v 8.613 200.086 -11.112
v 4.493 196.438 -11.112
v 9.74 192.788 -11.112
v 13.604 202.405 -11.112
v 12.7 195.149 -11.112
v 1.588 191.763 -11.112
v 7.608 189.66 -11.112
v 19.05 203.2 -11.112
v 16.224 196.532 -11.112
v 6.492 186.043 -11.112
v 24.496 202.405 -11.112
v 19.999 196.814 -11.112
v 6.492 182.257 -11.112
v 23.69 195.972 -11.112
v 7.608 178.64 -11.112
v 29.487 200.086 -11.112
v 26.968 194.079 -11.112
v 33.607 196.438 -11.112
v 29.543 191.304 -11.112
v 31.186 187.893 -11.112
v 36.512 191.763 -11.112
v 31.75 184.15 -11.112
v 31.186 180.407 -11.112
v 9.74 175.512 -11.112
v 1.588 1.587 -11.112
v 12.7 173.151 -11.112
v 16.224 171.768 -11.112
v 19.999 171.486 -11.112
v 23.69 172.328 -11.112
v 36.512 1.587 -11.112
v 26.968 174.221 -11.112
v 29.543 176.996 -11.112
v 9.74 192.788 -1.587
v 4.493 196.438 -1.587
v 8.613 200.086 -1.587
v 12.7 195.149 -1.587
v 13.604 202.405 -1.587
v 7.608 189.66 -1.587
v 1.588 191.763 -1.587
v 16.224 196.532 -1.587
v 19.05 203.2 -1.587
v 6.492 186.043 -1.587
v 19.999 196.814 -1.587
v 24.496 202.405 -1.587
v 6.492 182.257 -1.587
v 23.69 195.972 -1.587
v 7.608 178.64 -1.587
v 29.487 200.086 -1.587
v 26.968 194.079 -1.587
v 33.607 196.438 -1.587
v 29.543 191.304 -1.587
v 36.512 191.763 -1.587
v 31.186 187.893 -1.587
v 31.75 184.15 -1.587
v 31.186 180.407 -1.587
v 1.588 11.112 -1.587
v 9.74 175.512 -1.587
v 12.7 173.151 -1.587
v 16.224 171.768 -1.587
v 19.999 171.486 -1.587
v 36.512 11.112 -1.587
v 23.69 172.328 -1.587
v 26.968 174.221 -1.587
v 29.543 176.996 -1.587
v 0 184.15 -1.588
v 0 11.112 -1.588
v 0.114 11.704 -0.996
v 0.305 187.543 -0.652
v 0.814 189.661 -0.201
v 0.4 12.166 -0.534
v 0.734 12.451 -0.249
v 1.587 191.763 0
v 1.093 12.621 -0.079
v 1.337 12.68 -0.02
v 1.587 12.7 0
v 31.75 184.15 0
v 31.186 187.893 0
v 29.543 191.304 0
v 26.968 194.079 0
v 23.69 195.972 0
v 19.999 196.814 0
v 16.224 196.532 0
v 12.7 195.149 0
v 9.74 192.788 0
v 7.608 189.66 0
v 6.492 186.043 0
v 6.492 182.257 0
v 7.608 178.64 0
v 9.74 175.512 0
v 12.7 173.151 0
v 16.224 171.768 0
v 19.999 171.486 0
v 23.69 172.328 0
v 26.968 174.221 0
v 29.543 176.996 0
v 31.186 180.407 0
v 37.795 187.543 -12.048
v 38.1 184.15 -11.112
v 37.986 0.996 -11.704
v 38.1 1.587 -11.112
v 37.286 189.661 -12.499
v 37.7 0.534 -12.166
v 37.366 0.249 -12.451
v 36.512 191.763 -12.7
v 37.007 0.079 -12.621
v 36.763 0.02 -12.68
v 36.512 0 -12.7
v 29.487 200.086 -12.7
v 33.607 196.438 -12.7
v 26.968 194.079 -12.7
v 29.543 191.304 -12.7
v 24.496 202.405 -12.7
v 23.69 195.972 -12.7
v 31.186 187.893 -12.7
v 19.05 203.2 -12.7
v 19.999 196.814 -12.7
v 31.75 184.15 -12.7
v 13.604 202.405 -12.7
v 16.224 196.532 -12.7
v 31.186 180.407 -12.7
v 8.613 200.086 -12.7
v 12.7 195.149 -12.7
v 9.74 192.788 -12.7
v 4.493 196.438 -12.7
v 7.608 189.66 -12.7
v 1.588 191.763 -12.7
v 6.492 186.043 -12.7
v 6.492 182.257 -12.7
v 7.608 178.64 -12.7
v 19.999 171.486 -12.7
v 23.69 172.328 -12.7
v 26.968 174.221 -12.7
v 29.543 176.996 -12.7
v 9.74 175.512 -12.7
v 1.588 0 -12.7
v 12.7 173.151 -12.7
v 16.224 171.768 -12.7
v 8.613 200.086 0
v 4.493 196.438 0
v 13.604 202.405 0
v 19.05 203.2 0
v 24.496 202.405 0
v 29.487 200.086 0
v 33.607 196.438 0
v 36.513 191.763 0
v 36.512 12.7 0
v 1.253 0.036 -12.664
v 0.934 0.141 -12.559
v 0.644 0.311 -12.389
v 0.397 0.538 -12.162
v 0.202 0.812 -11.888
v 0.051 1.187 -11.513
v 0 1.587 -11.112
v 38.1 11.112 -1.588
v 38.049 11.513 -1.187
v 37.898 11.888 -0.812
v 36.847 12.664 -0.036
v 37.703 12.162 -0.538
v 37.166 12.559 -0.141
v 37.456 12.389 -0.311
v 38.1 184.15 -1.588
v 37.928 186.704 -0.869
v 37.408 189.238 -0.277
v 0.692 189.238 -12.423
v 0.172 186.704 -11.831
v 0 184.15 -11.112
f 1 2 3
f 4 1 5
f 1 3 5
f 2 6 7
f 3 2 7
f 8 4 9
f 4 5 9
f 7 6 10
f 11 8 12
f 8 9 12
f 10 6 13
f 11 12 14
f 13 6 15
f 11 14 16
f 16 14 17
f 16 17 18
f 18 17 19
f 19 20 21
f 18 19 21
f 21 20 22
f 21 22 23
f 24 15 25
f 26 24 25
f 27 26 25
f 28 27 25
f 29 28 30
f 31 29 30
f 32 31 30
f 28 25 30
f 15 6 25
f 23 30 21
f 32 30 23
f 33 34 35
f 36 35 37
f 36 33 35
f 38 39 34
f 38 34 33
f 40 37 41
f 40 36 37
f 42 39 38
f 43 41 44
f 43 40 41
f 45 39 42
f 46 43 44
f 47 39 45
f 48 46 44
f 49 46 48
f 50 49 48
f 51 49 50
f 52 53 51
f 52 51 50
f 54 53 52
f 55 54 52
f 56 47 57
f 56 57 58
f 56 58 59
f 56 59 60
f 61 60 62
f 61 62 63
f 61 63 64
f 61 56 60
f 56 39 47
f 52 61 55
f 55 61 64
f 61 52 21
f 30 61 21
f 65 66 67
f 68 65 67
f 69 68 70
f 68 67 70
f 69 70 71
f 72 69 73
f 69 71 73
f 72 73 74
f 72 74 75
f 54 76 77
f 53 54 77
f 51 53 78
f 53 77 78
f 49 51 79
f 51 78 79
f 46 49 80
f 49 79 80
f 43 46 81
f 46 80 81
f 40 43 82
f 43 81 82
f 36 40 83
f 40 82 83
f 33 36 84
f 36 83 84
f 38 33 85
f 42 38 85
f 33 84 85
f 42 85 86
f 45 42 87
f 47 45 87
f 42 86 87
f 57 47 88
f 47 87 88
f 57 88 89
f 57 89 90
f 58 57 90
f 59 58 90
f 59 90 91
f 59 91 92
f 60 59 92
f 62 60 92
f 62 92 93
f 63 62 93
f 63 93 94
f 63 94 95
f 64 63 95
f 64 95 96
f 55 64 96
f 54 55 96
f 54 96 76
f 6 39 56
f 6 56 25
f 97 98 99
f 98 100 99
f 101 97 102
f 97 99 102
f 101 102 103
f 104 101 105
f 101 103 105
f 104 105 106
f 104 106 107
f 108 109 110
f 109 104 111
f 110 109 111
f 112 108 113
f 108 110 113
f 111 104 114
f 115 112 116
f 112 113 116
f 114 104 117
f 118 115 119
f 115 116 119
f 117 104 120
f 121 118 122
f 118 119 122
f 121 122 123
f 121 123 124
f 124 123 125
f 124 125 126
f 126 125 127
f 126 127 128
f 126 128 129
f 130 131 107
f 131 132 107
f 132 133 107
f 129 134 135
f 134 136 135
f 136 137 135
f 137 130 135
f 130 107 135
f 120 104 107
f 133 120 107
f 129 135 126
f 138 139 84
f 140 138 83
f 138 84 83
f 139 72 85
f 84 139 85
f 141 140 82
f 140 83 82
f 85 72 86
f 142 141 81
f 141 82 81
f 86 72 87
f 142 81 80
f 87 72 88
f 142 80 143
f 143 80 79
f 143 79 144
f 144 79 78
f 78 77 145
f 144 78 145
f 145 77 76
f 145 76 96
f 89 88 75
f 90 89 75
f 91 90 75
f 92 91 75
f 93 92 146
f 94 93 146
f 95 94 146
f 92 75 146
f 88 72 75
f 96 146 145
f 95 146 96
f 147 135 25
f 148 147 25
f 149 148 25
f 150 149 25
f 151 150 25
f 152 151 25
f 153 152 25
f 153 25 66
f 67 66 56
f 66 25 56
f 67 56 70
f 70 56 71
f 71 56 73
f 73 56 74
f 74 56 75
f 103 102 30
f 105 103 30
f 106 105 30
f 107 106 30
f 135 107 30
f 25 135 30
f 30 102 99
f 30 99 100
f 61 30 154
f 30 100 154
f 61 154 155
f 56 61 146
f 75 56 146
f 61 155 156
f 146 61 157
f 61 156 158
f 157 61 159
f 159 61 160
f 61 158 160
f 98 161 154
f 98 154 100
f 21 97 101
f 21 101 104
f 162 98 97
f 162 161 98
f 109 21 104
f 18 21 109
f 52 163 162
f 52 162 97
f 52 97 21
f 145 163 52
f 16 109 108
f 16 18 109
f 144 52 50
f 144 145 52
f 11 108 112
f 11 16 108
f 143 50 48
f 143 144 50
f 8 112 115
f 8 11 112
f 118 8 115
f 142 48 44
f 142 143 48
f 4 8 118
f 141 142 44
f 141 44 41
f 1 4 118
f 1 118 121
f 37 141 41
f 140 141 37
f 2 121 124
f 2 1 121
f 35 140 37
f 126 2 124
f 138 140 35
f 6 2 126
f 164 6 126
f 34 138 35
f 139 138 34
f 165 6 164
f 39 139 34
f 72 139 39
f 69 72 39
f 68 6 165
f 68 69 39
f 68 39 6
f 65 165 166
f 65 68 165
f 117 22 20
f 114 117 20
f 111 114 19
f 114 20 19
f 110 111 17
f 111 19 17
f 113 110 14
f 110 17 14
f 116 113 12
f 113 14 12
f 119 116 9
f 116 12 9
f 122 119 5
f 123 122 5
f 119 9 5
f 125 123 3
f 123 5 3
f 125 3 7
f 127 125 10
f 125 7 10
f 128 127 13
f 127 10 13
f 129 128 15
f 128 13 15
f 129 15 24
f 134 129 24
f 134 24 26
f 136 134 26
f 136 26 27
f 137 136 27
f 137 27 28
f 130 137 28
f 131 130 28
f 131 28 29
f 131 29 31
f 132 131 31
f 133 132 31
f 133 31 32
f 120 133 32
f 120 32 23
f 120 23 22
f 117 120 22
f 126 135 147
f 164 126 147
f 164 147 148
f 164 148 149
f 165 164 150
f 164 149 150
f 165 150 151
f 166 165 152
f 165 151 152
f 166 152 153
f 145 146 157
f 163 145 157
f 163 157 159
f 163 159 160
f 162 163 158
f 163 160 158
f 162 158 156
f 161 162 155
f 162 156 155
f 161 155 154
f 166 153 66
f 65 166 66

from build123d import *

# Parameters (mm, degrees)
SKETCH1_W           = 34.925
SKETCH1_H           = 9.525
BOSS_EXTRUDE1_DEPTH = 203.2
SKETCH2_R           = 12.7
CUT_EXTRUDE1_DEPTH  = 13.7
CUT_EXTRUDE2_DEPTH  = 39.1000001


with BuildPart() as part:
    # Sketch1 → Boss-Extrude1 (new body)
    with BuildSketch(Plane(origin=(0, 0, 0), x_dir=(1, 0, 0), z_dir=(0, 1, 0))):
        with BuildLine():
            Line((1.5875, 0), (36.5125, 0))
            ThreePointArc((36.5125, 0), (37.635032015, 0.464967985), (38.1, 1.5875))
            Line((38.1, 1.5875), (38.1, 11.1125))
            ThreePointArc((38.1, 11.1125), (37.635032015, 12.235032015), (36.5125, 12.7))
            Line((36.5125, 12.7), (1.5875, 12.7))
            ThreePointArc((1.5875, 12.7), (0.464967985, 12.235032015), (0, 11.1125))
            Line((0, 11.1125), (0, 1.5875))
            ThreePointArc((0, 1.5875), (0.464967985, 0.464967985), (1.5875, 0))
        make_face()
        with Locations((19.05, 6.35)):
            Rectangle(SKETCH1_W, SKETCH1_H, mode=Mode.SUBTRACT)
    extrude(amount=BOSS_EXTRUDE1_DEPTH)

    # Sketch2 → Cut-Extrude1 (cut, through all)
    with BuildSketch(Plane.XY):
        with Locations((19.05, 184.15)):
            Circle(SKETCH2_R)
        with BuildLine():
            Line((0, 184.15), (0, 209.55))
            Line((0, 209.55), (38.1, 209.55))
            Line((38.1, 209.55), (38.1, 184.15))
            ThreePointArc((38.1, 184.15), (19.05, 203.2), (0, 184.15))
        make_face()
    extrude(amount=-CUT_EXTRUDE1_DEPTH, mode=Mode.SUBTRACT)

    # Sketch3 → Cut-Extrude2 (cut, through all)
    with BuildSketch(Plane(origin=(38.1, 0, 0), x_dir=(0, 0, -1), z_dir=(1, 0, 0))):
        Polygon((0, 0), (12.7, 0), (0, 12.7), align=None)
    extrude(amount=-CUT_EXTRUDE2_DEPTH, mode=Mode.SUBTRACT)


solid = part.part
